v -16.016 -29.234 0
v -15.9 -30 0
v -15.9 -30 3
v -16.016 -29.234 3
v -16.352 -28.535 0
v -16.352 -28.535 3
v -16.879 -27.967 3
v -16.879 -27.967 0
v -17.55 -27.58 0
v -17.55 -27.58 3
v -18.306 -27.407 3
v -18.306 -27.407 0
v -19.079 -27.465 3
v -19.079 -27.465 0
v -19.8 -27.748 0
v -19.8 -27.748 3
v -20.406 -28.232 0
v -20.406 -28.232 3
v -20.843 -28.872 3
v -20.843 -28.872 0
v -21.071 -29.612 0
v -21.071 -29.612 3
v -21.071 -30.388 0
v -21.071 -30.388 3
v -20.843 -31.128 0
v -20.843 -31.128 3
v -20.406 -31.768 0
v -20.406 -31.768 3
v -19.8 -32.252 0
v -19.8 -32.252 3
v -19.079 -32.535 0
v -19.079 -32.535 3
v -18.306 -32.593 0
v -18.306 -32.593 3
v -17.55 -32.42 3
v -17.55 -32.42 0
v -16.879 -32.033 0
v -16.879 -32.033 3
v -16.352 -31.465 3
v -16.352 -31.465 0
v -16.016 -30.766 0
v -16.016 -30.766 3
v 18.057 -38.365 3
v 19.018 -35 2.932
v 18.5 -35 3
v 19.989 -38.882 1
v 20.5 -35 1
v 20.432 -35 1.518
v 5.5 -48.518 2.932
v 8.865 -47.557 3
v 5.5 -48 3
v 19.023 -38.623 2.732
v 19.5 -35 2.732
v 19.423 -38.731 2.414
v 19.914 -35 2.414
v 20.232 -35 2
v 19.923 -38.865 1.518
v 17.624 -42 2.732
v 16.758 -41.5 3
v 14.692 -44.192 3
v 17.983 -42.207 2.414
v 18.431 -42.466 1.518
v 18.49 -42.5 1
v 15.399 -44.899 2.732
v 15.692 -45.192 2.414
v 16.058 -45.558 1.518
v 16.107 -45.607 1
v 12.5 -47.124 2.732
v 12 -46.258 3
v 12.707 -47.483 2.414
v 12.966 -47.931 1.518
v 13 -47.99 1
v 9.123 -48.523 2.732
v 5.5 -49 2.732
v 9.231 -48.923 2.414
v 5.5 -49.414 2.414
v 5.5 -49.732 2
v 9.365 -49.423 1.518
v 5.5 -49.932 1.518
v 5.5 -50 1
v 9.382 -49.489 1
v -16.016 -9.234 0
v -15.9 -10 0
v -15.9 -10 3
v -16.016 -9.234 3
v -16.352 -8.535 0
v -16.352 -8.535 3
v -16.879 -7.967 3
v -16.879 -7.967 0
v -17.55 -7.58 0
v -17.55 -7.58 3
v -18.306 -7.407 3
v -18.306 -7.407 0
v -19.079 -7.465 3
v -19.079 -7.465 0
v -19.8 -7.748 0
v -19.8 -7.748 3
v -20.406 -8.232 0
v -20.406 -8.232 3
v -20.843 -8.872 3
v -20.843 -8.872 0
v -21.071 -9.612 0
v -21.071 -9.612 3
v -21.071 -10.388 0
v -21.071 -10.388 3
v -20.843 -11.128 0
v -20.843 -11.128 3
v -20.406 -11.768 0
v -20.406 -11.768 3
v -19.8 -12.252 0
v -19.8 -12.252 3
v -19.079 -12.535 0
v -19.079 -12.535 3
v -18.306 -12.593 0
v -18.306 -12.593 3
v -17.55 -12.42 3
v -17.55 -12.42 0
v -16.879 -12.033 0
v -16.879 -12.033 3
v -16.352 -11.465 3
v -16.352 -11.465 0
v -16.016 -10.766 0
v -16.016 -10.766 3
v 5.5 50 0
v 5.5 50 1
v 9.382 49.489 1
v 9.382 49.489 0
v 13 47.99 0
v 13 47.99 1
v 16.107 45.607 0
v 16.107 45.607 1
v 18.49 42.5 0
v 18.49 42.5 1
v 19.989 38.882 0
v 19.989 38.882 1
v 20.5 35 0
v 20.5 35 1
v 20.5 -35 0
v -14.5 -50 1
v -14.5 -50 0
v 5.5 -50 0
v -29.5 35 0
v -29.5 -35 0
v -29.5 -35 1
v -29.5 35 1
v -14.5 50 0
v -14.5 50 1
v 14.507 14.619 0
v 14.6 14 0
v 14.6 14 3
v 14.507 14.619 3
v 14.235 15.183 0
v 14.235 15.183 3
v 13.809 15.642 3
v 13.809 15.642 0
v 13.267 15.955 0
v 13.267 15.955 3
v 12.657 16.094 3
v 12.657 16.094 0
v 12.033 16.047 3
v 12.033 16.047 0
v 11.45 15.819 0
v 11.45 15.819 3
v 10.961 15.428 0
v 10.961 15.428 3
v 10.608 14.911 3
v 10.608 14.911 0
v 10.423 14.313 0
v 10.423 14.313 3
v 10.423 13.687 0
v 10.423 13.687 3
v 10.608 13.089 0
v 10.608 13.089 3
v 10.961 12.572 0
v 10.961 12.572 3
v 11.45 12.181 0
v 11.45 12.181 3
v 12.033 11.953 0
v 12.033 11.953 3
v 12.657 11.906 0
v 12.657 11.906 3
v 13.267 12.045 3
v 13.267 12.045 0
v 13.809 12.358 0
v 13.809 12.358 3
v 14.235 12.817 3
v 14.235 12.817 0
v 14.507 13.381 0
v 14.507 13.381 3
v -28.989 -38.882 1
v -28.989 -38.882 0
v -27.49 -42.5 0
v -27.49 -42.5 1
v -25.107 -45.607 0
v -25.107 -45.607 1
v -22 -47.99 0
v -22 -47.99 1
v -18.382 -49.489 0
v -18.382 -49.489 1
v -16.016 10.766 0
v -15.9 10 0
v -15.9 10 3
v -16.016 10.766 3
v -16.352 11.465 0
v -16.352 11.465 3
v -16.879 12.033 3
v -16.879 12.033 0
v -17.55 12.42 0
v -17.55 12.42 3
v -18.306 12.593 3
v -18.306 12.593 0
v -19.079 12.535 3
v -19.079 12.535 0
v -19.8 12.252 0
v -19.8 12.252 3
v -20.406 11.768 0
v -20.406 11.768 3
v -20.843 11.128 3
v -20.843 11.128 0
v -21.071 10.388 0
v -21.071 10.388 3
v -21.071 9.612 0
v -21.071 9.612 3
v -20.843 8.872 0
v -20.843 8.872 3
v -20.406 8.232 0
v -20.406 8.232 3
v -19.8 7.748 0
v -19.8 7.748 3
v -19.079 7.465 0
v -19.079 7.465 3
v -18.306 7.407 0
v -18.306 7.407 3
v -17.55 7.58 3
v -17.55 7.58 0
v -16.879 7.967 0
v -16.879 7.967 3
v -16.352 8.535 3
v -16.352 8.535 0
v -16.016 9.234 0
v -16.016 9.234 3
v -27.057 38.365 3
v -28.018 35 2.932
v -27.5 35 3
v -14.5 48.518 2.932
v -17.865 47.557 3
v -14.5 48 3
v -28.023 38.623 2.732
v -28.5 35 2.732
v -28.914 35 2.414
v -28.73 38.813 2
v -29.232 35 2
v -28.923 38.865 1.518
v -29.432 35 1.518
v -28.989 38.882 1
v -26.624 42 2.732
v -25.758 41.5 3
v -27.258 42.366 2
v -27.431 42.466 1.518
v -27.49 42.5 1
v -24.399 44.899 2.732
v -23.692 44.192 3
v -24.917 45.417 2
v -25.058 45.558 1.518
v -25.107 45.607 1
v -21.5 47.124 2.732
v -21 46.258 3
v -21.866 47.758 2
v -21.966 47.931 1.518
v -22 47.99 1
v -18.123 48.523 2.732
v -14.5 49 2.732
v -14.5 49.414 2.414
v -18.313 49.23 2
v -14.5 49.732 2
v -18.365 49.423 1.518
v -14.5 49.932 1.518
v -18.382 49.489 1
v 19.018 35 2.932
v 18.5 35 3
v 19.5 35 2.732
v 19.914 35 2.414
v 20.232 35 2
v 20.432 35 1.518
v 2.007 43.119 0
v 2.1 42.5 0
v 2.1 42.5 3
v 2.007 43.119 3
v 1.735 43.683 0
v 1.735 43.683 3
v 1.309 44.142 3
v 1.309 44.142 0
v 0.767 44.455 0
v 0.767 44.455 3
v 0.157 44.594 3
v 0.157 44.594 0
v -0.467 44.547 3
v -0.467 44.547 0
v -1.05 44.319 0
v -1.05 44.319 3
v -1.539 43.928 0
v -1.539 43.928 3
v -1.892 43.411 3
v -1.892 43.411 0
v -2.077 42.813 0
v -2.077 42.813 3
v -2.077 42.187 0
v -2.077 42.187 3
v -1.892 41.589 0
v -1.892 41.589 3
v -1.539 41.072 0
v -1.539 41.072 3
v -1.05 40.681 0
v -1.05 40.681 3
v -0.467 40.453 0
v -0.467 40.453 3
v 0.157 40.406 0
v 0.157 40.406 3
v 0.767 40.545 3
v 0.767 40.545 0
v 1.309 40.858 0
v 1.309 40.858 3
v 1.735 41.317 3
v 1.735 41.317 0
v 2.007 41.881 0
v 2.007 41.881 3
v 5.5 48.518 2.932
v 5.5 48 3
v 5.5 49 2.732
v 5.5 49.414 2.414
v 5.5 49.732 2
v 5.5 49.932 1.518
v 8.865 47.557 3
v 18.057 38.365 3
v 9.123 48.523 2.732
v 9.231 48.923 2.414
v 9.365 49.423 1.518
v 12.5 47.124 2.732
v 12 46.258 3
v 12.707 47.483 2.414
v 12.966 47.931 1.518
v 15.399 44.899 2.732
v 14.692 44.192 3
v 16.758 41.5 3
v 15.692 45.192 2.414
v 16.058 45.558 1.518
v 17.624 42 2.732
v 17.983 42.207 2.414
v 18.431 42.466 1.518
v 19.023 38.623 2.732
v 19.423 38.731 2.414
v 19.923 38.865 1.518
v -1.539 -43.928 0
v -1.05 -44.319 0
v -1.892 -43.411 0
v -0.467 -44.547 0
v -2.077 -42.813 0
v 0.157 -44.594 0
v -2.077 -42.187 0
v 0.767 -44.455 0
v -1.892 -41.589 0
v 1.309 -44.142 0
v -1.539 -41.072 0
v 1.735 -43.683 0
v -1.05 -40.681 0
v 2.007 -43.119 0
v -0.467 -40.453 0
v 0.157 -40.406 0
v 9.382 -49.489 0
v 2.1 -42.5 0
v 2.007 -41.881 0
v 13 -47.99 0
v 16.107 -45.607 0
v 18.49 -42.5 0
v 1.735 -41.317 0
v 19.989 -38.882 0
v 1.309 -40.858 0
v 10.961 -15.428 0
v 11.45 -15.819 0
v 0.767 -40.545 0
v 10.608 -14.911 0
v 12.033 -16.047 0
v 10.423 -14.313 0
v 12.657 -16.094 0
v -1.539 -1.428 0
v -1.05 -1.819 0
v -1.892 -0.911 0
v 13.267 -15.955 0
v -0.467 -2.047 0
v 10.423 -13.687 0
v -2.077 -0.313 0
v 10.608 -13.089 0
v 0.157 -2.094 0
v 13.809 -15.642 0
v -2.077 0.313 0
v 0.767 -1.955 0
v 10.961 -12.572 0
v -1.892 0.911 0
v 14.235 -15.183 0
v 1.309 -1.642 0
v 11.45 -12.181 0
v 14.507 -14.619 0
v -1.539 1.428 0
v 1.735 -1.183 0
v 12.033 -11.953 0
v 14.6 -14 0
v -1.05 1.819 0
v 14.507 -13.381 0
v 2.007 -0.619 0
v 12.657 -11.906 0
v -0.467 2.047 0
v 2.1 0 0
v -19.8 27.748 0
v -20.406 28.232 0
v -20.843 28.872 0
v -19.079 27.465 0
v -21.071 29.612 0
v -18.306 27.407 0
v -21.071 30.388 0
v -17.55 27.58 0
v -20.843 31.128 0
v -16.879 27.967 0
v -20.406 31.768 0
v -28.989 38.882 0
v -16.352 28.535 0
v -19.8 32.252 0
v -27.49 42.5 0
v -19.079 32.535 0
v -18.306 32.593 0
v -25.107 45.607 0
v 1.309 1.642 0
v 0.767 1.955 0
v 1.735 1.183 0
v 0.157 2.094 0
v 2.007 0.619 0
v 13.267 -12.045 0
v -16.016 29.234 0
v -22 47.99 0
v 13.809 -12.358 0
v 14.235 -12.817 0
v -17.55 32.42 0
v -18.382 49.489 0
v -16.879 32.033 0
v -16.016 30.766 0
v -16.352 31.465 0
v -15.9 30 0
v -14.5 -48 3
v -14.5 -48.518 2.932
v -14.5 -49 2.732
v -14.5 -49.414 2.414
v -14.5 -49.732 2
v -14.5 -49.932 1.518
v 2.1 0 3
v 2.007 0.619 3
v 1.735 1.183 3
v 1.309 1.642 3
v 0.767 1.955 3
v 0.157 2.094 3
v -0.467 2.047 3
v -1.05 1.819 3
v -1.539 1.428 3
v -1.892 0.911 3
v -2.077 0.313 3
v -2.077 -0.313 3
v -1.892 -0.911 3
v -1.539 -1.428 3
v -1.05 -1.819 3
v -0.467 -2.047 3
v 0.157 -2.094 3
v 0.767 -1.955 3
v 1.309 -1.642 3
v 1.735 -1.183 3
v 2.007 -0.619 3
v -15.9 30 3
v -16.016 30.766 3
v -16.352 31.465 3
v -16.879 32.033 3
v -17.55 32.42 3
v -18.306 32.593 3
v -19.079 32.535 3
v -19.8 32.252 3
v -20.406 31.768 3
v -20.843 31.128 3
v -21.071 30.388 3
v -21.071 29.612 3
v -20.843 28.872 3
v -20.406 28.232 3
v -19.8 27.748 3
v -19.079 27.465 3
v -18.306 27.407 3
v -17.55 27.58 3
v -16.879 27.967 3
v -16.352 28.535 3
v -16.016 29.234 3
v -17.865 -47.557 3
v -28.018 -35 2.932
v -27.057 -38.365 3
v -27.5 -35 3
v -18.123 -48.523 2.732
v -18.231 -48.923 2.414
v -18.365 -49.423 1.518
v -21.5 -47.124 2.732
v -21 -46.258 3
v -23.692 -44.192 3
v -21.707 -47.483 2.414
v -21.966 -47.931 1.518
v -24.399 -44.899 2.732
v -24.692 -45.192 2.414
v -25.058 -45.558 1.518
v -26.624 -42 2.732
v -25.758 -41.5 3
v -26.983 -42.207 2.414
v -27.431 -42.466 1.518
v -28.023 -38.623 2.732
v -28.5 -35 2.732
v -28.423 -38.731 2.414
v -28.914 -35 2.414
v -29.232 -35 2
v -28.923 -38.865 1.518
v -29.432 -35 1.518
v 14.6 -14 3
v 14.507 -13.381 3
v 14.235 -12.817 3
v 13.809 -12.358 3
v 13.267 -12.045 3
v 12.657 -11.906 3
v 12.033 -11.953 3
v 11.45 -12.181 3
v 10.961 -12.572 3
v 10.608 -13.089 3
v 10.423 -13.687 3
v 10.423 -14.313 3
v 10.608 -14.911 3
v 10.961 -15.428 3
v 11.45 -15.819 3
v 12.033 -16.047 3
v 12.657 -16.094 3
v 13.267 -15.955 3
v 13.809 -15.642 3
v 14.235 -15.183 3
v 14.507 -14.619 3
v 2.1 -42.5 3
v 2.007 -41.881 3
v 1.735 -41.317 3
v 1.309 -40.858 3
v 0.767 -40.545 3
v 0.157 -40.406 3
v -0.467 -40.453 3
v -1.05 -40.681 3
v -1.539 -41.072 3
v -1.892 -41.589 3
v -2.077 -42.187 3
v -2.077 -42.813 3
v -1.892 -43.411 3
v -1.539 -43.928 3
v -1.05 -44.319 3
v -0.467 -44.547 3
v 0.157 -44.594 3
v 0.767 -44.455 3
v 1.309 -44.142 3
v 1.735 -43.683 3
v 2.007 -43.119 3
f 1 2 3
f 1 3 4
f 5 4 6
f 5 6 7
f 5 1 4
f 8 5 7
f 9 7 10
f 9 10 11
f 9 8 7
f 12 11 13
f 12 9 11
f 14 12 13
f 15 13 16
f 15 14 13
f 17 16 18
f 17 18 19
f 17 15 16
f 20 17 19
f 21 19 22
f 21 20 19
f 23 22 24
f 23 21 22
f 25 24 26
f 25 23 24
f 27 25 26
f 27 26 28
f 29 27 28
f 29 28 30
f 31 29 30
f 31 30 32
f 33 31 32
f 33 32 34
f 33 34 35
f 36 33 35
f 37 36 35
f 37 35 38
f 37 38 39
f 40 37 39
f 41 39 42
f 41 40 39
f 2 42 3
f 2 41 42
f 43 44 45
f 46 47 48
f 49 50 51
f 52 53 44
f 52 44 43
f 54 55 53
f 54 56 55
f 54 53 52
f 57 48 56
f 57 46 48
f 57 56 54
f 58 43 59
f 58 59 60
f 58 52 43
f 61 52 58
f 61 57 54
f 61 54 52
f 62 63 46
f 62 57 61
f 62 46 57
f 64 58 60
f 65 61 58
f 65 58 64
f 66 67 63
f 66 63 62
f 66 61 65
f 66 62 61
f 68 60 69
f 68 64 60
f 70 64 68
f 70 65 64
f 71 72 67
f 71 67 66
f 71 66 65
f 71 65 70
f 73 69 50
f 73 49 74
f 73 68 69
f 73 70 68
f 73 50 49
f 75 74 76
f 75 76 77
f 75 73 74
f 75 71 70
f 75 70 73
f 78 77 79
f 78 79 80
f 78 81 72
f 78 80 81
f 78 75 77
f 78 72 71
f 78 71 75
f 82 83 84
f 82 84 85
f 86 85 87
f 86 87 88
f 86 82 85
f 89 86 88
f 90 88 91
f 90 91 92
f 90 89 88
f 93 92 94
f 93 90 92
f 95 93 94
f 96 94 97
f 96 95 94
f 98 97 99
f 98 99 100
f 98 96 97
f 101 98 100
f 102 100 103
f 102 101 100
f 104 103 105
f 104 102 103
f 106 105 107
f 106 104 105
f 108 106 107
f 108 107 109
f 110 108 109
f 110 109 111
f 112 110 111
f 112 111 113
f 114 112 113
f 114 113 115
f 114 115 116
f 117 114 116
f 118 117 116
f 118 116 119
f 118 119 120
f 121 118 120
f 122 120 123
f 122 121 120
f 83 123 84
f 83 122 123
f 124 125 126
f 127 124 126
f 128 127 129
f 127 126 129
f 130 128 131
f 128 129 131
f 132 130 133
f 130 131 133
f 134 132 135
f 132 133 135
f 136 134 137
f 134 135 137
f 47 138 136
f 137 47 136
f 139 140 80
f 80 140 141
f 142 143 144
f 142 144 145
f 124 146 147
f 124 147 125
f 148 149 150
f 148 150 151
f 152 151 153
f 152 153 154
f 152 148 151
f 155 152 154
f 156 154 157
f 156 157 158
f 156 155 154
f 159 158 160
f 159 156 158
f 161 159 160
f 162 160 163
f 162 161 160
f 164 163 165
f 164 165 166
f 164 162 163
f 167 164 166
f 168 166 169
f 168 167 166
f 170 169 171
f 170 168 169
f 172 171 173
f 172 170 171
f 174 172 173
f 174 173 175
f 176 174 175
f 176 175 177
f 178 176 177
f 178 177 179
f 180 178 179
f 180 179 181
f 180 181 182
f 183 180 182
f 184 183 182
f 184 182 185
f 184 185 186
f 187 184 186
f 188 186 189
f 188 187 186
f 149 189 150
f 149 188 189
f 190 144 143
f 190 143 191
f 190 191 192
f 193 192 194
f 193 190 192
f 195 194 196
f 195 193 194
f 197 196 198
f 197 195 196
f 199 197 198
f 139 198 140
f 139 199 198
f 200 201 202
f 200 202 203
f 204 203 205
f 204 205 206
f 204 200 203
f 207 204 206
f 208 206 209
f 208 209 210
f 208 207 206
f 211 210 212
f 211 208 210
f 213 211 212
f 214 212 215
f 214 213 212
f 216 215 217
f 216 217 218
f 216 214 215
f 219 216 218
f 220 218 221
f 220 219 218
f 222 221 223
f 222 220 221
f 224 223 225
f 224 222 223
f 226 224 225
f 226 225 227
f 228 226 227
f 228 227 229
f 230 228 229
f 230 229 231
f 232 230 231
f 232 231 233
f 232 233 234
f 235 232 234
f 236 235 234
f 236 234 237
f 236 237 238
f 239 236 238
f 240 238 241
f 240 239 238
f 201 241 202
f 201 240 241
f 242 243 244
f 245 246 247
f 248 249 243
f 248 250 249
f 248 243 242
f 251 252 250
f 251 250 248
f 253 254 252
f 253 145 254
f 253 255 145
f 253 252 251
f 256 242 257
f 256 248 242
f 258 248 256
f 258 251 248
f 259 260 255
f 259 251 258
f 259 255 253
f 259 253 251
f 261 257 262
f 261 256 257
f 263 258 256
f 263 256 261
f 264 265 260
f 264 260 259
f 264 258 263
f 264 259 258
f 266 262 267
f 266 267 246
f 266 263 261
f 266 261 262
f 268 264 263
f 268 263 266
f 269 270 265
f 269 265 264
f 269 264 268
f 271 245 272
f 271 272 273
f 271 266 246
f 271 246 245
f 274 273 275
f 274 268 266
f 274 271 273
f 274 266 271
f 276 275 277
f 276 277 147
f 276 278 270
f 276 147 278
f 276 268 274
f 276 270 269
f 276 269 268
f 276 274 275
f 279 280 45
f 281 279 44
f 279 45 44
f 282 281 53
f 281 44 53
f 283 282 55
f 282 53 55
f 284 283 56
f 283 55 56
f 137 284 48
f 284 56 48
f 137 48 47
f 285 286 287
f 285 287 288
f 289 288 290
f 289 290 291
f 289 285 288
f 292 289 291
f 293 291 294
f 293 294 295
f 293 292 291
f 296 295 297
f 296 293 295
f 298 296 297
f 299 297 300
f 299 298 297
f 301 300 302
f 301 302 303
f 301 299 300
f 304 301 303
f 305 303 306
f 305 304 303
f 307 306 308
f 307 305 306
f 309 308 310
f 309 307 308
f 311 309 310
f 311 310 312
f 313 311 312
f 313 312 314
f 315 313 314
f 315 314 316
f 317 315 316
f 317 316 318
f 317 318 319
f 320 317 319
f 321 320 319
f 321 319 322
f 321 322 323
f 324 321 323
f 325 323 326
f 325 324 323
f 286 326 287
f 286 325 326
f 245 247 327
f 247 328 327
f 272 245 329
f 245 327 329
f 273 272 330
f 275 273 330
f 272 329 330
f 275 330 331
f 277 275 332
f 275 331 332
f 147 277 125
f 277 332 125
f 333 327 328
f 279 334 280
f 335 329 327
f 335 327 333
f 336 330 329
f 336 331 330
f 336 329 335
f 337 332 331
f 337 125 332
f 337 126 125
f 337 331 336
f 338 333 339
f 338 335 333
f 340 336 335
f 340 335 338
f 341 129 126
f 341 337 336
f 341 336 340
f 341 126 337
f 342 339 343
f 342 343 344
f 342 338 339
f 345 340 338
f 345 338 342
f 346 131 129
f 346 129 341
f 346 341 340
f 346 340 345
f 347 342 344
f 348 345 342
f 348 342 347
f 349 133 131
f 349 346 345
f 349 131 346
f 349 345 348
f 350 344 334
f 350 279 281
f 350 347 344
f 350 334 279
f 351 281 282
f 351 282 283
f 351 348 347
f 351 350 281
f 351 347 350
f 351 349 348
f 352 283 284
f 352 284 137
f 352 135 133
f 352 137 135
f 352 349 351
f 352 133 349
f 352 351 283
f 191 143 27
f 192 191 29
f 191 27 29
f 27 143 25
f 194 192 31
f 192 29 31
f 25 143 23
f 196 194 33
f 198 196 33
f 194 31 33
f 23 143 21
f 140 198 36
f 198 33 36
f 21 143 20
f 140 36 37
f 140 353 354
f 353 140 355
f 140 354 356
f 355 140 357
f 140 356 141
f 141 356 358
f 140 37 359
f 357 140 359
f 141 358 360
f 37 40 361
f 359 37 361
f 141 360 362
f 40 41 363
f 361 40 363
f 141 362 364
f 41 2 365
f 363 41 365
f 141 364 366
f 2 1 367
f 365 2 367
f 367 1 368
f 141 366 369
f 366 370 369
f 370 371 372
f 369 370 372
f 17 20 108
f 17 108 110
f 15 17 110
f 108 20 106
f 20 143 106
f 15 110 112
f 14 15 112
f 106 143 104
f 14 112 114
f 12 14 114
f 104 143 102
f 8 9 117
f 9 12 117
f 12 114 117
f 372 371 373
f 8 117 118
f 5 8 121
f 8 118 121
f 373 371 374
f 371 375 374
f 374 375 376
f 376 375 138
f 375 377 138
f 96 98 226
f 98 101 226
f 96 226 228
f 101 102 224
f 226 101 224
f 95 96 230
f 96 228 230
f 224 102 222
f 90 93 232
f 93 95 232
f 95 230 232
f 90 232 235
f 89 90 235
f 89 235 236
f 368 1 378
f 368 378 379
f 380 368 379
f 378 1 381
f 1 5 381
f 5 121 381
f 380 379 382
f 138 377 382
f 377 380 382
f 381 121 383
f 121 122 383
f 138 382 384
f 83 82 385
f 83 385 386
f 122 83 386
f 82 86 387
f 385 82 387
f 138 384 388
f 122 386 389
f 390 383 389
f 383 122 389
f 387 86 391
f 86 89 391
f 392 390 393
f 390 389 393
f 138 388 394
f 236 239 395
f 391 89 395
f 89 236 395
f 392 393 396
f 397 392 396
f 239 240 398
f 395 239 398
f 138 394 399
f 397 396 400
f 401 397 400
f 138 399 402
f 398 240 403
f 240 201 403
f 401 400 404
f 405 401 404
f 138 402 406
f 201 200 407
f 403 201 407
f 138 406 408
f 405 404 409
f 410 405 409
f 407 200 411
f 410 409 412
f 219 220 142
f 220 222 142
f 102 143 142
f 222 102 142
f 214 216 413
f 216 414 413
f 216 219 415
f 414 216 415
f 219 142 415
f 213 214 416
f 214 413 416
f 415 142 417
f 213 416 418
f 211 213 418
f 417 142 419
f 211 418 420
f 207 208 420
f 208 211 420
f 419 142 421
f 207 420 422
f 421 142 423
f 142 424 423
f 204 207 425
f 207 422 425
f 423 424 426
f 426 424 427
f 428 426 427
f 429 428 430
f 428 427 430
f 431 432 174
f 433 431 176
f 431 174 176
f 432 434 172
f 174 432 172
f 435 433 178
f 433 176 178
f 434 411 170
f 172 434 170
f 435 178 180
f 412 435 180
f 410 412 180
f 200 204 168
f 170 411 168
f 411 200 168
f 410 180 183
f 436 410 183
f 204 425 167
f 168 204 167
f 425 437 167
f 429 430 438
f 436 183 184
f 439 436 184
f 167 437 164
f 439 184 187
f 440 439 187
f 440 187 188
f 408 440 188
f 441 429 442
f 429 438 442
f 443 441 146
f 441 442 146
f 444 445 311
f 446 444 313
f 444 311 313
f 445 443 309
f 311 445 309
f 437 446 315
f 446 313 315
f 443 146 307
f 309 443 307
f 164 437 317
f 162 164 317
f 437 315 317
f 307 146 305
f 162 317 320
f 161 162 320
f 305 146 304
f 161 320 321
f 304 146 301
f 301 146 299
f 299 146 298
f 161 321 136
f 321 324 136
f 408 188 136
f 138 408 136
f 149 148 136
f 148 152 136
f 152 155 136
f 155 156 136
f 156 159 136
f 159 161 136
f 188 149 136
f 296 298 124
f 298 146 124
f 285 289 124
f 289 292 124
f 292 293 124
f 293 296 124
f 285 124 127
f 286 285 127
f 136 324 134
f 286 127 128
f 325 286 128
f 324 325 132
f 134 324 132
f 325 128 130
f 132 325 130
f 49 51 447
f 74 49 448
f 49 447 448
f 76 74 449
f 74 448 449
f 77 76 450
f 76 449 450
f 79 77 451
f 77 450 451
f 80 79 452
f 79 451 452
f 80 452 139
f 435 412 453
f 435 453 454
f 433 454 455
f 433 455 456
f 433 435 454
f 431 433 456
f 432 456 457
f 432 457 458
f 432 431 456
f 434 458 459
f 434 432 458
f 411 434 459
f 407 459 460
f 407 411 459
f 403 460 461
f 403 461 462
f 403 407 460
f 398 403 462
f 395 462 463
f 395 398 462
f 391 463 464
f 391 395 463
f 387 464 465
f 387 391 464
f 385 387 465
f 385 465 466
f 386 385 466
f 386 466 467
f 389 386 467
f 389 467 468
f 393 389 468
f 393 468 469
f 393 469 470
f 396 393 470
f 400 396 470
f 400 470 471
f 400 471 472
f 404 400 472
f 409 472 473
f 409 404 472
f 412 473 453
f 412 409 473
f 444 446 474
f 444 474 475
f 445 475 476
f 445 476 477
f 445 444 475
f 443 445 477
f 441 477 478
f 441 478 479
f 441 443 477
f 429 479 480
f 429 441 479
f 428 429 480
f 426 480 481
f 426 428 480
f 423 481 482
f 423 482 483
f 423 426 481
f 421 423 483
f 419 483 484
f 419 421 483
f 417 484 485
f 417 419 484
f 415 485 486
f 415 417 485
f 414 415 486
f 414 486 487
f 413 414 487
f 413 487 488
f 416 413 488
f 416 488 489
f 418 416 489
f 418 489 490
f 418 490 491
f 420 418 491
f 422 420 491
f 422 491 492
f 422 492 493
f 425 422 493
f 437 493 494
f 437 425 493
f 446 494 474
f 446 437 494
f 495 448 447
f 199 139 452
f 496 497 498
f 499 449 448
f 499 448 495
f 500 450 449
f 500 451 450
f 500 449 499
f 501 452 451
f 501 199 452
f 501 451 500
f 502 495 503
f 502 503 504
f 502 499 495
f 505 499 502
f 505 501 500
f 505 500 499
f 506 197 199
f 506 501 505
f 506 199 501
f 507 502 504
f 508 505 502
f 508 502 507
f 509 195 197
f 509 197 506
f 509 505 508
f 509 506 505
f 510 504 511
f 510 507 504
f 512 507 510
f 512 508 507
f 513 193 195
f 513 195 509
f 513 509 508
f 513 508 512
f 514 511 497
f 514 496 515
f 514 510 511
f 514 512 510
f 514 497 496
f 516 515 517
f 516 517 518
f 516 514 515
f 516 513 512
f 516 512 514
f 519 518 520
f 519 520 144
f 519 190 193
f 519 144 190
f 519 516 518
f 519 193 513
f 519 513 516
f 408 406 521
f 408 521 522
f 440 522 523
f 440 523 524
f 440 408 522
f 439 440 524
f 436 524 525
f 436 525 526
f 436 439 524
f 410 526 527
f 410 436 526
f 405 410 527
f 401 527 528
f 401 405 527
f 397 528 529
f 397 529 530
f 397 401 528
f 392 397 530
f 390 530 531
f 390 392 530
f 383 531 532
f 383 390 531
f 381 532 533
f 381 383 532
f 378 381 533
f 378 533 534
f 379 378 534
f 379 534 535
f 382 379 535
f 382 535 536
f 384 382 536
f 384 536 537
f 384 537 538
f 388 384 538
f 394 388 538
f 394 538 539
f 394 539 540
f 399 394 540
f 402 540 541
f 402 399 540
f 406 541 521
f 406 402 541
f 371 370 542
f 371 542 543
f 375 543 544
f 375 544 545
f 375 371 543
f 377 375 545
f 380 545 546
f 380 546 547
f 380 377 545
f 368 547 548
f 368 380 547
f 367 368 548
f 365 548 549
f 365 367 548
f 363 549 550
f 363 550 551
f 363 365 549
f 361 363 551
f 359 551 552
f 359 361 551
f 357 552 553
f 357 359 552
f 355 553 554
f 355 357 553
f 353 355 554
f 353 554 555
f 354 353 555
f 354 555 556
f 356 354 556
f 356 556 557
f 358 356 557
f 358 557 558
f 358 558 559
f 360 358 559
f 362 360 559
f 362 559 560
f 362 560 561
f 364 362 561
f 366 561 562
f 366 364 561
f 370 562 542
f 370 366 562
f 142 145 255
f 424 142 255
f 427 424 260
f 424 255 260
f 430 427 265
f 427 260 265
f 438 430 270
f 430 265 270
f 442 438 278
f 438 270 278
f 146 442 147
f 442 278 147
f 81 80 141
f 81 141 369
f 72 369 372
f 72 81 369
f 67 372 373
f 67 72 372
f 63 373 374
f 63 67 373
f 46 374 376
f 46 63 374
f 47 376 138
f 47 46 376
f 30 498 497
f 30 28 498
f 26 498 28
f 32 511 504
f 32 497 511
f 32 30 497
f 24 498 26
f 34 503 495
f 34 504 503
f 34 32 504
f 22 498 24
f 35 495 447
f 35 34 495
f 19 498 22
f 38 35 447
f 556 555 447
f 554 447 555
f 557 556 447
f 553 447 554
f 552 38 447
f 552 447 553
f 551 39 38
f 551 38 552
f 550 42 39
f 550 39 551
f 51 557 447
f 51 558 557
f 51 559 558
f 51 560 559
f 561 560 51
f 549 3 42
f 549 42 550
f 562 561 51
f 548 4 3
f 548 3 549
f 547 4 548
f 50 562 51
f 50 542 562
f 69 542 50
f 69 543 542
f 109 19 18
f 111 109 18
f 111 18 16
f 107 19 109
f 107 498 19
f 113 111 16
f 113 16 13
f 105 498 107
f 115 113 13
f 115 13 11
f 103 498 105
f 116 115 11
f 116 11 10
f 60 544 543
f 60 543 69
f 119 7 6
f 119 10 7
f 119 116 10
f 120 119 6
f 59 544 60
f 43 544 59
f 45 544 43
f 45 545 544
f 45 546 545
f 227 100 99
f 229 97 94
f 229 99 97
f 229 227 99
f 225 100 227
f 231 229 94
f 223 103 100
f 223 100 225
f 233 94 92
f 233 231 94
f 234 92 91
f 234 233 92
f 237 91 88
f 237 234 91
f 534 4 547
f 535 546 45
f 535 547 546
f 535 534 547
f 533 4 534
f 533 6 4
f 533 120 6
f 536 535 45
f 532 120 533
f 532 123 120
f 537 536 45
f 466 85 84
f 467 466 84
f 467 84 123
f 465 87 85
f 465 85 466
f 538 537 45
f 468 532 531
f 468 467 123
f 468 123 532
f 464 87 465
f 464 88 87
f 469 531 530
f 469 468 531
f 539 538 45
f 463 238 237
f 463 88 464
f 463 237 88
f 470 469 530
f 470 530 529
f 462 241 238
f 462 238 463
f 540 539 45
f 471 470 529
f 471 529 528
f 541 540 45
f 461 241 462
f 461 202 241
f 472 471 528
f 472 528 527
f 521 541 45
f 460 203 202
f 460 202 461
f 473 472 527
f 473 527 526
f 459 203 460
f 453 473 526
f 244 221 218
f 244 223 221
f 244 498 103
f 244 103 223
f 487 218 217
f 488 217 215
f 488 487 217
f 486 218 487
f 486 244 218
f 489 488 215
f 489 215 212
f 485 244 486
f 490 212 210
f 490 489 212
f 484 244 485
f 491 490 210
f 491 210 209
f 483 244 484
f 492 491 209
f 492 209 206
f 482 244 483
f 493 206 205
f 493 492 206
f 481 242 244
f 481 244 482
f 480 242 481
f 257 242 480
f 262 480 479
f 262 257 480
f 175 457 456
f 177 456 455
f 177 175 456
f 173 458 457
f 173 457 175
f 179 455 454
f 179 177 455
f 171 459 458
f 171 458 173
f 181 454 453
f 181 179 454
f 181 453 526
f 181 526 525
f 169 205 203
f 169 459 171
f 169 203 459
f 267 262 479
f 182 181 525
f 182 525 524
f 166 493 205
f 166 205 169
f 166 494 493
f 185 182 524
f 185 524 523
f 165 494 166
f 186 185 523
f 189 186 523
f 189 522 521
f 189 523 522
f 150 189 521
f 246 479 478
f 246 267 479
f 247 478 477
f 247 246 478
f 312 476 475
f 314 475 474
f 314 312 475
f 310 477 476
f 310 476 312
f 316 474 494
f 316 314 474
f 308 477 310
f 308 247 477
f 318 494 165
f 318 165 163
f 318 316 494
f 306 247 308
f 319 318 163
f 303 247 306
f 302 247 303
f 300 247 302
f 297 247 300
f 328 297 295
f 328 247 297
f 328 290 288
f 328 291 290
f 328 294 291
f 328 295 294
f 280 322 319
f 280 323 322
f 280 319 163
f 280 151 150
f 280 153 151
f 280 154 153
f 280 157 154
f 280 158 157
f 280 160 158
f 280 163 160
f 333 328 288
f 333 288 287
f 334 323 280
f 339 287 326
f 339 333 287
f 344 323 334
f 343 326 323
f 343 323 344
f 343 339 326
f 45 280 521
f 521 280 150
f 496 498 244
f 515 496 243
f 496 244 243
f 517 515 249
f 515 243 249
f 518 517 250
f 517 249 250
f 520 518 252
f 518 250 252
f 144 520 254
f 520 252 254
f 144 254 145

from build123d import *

# Parameters (mm, degrees)
F0_W     = 50
F0_H     = 100
F0_R     = 2.6
F0_R_2   = 2.1
F1_DEPTH = 3
F2_R     = 15
F3_R     = 2


with BuildPart() as f1:
    # F0 (on Top) → F1 (new body)
    with BuildSketch(Plane.XY):
        with Locations((-4.5, 0)):
            Rectangle(F0_W, F0_H)
        with Locations((-18.5, -30)):
            Circle(F0_R, mode=Mode.SUBTRACT)
        with Locations((-18.5, -10)):
            Circle(F0_R, mode=Mode.SUBTRACT)
        with Locations((0, -42.5)):
            Circle(F0_R_2, mode=Mode.SUBTRACT)
        with Locations((12.5, -14)):
            Circle(F0_R_2, mode=Mode.SUBTRACT)
        with Locations((-18.5, 10)):
            Circle(F0_R, mode=Mode.SUBTRACT)
        with Locations((-18.5, 30)):
            Circle(F0_R, mode=Mode.SUBTRACT)
        Circle(F0_R_2, mode=Mode.SUBTRACT)
        with Locations((12.5, 14)):
            Circle(F0_R_2, mode=Mode.SUBTRACT)
        with Locations((0, 42.5)):
            Circle(F0_R_2, mode=Mode.SUBTRACT)
    extrude(amount=F1_DEPTH)

    # F2
    f2_edges = [f1.edges().sort_by_distance(p)[0] for p in [
        (-29.5, -50, 1.5),
        (20.5, -50, 1.5),
        (20.5, 50, 1.5),
        (-29.5, 50, 1.5),
    ]]
    fillet(f2_edges, radius=F2_R)

    # F3
    f3_edges = [f1.edges().sort_by_distance(p)[0] for p in [
        (-4.5, 50, 3),
    ]]
    fillet(f3_edges, radius=F3_R)


solid = f1.part
